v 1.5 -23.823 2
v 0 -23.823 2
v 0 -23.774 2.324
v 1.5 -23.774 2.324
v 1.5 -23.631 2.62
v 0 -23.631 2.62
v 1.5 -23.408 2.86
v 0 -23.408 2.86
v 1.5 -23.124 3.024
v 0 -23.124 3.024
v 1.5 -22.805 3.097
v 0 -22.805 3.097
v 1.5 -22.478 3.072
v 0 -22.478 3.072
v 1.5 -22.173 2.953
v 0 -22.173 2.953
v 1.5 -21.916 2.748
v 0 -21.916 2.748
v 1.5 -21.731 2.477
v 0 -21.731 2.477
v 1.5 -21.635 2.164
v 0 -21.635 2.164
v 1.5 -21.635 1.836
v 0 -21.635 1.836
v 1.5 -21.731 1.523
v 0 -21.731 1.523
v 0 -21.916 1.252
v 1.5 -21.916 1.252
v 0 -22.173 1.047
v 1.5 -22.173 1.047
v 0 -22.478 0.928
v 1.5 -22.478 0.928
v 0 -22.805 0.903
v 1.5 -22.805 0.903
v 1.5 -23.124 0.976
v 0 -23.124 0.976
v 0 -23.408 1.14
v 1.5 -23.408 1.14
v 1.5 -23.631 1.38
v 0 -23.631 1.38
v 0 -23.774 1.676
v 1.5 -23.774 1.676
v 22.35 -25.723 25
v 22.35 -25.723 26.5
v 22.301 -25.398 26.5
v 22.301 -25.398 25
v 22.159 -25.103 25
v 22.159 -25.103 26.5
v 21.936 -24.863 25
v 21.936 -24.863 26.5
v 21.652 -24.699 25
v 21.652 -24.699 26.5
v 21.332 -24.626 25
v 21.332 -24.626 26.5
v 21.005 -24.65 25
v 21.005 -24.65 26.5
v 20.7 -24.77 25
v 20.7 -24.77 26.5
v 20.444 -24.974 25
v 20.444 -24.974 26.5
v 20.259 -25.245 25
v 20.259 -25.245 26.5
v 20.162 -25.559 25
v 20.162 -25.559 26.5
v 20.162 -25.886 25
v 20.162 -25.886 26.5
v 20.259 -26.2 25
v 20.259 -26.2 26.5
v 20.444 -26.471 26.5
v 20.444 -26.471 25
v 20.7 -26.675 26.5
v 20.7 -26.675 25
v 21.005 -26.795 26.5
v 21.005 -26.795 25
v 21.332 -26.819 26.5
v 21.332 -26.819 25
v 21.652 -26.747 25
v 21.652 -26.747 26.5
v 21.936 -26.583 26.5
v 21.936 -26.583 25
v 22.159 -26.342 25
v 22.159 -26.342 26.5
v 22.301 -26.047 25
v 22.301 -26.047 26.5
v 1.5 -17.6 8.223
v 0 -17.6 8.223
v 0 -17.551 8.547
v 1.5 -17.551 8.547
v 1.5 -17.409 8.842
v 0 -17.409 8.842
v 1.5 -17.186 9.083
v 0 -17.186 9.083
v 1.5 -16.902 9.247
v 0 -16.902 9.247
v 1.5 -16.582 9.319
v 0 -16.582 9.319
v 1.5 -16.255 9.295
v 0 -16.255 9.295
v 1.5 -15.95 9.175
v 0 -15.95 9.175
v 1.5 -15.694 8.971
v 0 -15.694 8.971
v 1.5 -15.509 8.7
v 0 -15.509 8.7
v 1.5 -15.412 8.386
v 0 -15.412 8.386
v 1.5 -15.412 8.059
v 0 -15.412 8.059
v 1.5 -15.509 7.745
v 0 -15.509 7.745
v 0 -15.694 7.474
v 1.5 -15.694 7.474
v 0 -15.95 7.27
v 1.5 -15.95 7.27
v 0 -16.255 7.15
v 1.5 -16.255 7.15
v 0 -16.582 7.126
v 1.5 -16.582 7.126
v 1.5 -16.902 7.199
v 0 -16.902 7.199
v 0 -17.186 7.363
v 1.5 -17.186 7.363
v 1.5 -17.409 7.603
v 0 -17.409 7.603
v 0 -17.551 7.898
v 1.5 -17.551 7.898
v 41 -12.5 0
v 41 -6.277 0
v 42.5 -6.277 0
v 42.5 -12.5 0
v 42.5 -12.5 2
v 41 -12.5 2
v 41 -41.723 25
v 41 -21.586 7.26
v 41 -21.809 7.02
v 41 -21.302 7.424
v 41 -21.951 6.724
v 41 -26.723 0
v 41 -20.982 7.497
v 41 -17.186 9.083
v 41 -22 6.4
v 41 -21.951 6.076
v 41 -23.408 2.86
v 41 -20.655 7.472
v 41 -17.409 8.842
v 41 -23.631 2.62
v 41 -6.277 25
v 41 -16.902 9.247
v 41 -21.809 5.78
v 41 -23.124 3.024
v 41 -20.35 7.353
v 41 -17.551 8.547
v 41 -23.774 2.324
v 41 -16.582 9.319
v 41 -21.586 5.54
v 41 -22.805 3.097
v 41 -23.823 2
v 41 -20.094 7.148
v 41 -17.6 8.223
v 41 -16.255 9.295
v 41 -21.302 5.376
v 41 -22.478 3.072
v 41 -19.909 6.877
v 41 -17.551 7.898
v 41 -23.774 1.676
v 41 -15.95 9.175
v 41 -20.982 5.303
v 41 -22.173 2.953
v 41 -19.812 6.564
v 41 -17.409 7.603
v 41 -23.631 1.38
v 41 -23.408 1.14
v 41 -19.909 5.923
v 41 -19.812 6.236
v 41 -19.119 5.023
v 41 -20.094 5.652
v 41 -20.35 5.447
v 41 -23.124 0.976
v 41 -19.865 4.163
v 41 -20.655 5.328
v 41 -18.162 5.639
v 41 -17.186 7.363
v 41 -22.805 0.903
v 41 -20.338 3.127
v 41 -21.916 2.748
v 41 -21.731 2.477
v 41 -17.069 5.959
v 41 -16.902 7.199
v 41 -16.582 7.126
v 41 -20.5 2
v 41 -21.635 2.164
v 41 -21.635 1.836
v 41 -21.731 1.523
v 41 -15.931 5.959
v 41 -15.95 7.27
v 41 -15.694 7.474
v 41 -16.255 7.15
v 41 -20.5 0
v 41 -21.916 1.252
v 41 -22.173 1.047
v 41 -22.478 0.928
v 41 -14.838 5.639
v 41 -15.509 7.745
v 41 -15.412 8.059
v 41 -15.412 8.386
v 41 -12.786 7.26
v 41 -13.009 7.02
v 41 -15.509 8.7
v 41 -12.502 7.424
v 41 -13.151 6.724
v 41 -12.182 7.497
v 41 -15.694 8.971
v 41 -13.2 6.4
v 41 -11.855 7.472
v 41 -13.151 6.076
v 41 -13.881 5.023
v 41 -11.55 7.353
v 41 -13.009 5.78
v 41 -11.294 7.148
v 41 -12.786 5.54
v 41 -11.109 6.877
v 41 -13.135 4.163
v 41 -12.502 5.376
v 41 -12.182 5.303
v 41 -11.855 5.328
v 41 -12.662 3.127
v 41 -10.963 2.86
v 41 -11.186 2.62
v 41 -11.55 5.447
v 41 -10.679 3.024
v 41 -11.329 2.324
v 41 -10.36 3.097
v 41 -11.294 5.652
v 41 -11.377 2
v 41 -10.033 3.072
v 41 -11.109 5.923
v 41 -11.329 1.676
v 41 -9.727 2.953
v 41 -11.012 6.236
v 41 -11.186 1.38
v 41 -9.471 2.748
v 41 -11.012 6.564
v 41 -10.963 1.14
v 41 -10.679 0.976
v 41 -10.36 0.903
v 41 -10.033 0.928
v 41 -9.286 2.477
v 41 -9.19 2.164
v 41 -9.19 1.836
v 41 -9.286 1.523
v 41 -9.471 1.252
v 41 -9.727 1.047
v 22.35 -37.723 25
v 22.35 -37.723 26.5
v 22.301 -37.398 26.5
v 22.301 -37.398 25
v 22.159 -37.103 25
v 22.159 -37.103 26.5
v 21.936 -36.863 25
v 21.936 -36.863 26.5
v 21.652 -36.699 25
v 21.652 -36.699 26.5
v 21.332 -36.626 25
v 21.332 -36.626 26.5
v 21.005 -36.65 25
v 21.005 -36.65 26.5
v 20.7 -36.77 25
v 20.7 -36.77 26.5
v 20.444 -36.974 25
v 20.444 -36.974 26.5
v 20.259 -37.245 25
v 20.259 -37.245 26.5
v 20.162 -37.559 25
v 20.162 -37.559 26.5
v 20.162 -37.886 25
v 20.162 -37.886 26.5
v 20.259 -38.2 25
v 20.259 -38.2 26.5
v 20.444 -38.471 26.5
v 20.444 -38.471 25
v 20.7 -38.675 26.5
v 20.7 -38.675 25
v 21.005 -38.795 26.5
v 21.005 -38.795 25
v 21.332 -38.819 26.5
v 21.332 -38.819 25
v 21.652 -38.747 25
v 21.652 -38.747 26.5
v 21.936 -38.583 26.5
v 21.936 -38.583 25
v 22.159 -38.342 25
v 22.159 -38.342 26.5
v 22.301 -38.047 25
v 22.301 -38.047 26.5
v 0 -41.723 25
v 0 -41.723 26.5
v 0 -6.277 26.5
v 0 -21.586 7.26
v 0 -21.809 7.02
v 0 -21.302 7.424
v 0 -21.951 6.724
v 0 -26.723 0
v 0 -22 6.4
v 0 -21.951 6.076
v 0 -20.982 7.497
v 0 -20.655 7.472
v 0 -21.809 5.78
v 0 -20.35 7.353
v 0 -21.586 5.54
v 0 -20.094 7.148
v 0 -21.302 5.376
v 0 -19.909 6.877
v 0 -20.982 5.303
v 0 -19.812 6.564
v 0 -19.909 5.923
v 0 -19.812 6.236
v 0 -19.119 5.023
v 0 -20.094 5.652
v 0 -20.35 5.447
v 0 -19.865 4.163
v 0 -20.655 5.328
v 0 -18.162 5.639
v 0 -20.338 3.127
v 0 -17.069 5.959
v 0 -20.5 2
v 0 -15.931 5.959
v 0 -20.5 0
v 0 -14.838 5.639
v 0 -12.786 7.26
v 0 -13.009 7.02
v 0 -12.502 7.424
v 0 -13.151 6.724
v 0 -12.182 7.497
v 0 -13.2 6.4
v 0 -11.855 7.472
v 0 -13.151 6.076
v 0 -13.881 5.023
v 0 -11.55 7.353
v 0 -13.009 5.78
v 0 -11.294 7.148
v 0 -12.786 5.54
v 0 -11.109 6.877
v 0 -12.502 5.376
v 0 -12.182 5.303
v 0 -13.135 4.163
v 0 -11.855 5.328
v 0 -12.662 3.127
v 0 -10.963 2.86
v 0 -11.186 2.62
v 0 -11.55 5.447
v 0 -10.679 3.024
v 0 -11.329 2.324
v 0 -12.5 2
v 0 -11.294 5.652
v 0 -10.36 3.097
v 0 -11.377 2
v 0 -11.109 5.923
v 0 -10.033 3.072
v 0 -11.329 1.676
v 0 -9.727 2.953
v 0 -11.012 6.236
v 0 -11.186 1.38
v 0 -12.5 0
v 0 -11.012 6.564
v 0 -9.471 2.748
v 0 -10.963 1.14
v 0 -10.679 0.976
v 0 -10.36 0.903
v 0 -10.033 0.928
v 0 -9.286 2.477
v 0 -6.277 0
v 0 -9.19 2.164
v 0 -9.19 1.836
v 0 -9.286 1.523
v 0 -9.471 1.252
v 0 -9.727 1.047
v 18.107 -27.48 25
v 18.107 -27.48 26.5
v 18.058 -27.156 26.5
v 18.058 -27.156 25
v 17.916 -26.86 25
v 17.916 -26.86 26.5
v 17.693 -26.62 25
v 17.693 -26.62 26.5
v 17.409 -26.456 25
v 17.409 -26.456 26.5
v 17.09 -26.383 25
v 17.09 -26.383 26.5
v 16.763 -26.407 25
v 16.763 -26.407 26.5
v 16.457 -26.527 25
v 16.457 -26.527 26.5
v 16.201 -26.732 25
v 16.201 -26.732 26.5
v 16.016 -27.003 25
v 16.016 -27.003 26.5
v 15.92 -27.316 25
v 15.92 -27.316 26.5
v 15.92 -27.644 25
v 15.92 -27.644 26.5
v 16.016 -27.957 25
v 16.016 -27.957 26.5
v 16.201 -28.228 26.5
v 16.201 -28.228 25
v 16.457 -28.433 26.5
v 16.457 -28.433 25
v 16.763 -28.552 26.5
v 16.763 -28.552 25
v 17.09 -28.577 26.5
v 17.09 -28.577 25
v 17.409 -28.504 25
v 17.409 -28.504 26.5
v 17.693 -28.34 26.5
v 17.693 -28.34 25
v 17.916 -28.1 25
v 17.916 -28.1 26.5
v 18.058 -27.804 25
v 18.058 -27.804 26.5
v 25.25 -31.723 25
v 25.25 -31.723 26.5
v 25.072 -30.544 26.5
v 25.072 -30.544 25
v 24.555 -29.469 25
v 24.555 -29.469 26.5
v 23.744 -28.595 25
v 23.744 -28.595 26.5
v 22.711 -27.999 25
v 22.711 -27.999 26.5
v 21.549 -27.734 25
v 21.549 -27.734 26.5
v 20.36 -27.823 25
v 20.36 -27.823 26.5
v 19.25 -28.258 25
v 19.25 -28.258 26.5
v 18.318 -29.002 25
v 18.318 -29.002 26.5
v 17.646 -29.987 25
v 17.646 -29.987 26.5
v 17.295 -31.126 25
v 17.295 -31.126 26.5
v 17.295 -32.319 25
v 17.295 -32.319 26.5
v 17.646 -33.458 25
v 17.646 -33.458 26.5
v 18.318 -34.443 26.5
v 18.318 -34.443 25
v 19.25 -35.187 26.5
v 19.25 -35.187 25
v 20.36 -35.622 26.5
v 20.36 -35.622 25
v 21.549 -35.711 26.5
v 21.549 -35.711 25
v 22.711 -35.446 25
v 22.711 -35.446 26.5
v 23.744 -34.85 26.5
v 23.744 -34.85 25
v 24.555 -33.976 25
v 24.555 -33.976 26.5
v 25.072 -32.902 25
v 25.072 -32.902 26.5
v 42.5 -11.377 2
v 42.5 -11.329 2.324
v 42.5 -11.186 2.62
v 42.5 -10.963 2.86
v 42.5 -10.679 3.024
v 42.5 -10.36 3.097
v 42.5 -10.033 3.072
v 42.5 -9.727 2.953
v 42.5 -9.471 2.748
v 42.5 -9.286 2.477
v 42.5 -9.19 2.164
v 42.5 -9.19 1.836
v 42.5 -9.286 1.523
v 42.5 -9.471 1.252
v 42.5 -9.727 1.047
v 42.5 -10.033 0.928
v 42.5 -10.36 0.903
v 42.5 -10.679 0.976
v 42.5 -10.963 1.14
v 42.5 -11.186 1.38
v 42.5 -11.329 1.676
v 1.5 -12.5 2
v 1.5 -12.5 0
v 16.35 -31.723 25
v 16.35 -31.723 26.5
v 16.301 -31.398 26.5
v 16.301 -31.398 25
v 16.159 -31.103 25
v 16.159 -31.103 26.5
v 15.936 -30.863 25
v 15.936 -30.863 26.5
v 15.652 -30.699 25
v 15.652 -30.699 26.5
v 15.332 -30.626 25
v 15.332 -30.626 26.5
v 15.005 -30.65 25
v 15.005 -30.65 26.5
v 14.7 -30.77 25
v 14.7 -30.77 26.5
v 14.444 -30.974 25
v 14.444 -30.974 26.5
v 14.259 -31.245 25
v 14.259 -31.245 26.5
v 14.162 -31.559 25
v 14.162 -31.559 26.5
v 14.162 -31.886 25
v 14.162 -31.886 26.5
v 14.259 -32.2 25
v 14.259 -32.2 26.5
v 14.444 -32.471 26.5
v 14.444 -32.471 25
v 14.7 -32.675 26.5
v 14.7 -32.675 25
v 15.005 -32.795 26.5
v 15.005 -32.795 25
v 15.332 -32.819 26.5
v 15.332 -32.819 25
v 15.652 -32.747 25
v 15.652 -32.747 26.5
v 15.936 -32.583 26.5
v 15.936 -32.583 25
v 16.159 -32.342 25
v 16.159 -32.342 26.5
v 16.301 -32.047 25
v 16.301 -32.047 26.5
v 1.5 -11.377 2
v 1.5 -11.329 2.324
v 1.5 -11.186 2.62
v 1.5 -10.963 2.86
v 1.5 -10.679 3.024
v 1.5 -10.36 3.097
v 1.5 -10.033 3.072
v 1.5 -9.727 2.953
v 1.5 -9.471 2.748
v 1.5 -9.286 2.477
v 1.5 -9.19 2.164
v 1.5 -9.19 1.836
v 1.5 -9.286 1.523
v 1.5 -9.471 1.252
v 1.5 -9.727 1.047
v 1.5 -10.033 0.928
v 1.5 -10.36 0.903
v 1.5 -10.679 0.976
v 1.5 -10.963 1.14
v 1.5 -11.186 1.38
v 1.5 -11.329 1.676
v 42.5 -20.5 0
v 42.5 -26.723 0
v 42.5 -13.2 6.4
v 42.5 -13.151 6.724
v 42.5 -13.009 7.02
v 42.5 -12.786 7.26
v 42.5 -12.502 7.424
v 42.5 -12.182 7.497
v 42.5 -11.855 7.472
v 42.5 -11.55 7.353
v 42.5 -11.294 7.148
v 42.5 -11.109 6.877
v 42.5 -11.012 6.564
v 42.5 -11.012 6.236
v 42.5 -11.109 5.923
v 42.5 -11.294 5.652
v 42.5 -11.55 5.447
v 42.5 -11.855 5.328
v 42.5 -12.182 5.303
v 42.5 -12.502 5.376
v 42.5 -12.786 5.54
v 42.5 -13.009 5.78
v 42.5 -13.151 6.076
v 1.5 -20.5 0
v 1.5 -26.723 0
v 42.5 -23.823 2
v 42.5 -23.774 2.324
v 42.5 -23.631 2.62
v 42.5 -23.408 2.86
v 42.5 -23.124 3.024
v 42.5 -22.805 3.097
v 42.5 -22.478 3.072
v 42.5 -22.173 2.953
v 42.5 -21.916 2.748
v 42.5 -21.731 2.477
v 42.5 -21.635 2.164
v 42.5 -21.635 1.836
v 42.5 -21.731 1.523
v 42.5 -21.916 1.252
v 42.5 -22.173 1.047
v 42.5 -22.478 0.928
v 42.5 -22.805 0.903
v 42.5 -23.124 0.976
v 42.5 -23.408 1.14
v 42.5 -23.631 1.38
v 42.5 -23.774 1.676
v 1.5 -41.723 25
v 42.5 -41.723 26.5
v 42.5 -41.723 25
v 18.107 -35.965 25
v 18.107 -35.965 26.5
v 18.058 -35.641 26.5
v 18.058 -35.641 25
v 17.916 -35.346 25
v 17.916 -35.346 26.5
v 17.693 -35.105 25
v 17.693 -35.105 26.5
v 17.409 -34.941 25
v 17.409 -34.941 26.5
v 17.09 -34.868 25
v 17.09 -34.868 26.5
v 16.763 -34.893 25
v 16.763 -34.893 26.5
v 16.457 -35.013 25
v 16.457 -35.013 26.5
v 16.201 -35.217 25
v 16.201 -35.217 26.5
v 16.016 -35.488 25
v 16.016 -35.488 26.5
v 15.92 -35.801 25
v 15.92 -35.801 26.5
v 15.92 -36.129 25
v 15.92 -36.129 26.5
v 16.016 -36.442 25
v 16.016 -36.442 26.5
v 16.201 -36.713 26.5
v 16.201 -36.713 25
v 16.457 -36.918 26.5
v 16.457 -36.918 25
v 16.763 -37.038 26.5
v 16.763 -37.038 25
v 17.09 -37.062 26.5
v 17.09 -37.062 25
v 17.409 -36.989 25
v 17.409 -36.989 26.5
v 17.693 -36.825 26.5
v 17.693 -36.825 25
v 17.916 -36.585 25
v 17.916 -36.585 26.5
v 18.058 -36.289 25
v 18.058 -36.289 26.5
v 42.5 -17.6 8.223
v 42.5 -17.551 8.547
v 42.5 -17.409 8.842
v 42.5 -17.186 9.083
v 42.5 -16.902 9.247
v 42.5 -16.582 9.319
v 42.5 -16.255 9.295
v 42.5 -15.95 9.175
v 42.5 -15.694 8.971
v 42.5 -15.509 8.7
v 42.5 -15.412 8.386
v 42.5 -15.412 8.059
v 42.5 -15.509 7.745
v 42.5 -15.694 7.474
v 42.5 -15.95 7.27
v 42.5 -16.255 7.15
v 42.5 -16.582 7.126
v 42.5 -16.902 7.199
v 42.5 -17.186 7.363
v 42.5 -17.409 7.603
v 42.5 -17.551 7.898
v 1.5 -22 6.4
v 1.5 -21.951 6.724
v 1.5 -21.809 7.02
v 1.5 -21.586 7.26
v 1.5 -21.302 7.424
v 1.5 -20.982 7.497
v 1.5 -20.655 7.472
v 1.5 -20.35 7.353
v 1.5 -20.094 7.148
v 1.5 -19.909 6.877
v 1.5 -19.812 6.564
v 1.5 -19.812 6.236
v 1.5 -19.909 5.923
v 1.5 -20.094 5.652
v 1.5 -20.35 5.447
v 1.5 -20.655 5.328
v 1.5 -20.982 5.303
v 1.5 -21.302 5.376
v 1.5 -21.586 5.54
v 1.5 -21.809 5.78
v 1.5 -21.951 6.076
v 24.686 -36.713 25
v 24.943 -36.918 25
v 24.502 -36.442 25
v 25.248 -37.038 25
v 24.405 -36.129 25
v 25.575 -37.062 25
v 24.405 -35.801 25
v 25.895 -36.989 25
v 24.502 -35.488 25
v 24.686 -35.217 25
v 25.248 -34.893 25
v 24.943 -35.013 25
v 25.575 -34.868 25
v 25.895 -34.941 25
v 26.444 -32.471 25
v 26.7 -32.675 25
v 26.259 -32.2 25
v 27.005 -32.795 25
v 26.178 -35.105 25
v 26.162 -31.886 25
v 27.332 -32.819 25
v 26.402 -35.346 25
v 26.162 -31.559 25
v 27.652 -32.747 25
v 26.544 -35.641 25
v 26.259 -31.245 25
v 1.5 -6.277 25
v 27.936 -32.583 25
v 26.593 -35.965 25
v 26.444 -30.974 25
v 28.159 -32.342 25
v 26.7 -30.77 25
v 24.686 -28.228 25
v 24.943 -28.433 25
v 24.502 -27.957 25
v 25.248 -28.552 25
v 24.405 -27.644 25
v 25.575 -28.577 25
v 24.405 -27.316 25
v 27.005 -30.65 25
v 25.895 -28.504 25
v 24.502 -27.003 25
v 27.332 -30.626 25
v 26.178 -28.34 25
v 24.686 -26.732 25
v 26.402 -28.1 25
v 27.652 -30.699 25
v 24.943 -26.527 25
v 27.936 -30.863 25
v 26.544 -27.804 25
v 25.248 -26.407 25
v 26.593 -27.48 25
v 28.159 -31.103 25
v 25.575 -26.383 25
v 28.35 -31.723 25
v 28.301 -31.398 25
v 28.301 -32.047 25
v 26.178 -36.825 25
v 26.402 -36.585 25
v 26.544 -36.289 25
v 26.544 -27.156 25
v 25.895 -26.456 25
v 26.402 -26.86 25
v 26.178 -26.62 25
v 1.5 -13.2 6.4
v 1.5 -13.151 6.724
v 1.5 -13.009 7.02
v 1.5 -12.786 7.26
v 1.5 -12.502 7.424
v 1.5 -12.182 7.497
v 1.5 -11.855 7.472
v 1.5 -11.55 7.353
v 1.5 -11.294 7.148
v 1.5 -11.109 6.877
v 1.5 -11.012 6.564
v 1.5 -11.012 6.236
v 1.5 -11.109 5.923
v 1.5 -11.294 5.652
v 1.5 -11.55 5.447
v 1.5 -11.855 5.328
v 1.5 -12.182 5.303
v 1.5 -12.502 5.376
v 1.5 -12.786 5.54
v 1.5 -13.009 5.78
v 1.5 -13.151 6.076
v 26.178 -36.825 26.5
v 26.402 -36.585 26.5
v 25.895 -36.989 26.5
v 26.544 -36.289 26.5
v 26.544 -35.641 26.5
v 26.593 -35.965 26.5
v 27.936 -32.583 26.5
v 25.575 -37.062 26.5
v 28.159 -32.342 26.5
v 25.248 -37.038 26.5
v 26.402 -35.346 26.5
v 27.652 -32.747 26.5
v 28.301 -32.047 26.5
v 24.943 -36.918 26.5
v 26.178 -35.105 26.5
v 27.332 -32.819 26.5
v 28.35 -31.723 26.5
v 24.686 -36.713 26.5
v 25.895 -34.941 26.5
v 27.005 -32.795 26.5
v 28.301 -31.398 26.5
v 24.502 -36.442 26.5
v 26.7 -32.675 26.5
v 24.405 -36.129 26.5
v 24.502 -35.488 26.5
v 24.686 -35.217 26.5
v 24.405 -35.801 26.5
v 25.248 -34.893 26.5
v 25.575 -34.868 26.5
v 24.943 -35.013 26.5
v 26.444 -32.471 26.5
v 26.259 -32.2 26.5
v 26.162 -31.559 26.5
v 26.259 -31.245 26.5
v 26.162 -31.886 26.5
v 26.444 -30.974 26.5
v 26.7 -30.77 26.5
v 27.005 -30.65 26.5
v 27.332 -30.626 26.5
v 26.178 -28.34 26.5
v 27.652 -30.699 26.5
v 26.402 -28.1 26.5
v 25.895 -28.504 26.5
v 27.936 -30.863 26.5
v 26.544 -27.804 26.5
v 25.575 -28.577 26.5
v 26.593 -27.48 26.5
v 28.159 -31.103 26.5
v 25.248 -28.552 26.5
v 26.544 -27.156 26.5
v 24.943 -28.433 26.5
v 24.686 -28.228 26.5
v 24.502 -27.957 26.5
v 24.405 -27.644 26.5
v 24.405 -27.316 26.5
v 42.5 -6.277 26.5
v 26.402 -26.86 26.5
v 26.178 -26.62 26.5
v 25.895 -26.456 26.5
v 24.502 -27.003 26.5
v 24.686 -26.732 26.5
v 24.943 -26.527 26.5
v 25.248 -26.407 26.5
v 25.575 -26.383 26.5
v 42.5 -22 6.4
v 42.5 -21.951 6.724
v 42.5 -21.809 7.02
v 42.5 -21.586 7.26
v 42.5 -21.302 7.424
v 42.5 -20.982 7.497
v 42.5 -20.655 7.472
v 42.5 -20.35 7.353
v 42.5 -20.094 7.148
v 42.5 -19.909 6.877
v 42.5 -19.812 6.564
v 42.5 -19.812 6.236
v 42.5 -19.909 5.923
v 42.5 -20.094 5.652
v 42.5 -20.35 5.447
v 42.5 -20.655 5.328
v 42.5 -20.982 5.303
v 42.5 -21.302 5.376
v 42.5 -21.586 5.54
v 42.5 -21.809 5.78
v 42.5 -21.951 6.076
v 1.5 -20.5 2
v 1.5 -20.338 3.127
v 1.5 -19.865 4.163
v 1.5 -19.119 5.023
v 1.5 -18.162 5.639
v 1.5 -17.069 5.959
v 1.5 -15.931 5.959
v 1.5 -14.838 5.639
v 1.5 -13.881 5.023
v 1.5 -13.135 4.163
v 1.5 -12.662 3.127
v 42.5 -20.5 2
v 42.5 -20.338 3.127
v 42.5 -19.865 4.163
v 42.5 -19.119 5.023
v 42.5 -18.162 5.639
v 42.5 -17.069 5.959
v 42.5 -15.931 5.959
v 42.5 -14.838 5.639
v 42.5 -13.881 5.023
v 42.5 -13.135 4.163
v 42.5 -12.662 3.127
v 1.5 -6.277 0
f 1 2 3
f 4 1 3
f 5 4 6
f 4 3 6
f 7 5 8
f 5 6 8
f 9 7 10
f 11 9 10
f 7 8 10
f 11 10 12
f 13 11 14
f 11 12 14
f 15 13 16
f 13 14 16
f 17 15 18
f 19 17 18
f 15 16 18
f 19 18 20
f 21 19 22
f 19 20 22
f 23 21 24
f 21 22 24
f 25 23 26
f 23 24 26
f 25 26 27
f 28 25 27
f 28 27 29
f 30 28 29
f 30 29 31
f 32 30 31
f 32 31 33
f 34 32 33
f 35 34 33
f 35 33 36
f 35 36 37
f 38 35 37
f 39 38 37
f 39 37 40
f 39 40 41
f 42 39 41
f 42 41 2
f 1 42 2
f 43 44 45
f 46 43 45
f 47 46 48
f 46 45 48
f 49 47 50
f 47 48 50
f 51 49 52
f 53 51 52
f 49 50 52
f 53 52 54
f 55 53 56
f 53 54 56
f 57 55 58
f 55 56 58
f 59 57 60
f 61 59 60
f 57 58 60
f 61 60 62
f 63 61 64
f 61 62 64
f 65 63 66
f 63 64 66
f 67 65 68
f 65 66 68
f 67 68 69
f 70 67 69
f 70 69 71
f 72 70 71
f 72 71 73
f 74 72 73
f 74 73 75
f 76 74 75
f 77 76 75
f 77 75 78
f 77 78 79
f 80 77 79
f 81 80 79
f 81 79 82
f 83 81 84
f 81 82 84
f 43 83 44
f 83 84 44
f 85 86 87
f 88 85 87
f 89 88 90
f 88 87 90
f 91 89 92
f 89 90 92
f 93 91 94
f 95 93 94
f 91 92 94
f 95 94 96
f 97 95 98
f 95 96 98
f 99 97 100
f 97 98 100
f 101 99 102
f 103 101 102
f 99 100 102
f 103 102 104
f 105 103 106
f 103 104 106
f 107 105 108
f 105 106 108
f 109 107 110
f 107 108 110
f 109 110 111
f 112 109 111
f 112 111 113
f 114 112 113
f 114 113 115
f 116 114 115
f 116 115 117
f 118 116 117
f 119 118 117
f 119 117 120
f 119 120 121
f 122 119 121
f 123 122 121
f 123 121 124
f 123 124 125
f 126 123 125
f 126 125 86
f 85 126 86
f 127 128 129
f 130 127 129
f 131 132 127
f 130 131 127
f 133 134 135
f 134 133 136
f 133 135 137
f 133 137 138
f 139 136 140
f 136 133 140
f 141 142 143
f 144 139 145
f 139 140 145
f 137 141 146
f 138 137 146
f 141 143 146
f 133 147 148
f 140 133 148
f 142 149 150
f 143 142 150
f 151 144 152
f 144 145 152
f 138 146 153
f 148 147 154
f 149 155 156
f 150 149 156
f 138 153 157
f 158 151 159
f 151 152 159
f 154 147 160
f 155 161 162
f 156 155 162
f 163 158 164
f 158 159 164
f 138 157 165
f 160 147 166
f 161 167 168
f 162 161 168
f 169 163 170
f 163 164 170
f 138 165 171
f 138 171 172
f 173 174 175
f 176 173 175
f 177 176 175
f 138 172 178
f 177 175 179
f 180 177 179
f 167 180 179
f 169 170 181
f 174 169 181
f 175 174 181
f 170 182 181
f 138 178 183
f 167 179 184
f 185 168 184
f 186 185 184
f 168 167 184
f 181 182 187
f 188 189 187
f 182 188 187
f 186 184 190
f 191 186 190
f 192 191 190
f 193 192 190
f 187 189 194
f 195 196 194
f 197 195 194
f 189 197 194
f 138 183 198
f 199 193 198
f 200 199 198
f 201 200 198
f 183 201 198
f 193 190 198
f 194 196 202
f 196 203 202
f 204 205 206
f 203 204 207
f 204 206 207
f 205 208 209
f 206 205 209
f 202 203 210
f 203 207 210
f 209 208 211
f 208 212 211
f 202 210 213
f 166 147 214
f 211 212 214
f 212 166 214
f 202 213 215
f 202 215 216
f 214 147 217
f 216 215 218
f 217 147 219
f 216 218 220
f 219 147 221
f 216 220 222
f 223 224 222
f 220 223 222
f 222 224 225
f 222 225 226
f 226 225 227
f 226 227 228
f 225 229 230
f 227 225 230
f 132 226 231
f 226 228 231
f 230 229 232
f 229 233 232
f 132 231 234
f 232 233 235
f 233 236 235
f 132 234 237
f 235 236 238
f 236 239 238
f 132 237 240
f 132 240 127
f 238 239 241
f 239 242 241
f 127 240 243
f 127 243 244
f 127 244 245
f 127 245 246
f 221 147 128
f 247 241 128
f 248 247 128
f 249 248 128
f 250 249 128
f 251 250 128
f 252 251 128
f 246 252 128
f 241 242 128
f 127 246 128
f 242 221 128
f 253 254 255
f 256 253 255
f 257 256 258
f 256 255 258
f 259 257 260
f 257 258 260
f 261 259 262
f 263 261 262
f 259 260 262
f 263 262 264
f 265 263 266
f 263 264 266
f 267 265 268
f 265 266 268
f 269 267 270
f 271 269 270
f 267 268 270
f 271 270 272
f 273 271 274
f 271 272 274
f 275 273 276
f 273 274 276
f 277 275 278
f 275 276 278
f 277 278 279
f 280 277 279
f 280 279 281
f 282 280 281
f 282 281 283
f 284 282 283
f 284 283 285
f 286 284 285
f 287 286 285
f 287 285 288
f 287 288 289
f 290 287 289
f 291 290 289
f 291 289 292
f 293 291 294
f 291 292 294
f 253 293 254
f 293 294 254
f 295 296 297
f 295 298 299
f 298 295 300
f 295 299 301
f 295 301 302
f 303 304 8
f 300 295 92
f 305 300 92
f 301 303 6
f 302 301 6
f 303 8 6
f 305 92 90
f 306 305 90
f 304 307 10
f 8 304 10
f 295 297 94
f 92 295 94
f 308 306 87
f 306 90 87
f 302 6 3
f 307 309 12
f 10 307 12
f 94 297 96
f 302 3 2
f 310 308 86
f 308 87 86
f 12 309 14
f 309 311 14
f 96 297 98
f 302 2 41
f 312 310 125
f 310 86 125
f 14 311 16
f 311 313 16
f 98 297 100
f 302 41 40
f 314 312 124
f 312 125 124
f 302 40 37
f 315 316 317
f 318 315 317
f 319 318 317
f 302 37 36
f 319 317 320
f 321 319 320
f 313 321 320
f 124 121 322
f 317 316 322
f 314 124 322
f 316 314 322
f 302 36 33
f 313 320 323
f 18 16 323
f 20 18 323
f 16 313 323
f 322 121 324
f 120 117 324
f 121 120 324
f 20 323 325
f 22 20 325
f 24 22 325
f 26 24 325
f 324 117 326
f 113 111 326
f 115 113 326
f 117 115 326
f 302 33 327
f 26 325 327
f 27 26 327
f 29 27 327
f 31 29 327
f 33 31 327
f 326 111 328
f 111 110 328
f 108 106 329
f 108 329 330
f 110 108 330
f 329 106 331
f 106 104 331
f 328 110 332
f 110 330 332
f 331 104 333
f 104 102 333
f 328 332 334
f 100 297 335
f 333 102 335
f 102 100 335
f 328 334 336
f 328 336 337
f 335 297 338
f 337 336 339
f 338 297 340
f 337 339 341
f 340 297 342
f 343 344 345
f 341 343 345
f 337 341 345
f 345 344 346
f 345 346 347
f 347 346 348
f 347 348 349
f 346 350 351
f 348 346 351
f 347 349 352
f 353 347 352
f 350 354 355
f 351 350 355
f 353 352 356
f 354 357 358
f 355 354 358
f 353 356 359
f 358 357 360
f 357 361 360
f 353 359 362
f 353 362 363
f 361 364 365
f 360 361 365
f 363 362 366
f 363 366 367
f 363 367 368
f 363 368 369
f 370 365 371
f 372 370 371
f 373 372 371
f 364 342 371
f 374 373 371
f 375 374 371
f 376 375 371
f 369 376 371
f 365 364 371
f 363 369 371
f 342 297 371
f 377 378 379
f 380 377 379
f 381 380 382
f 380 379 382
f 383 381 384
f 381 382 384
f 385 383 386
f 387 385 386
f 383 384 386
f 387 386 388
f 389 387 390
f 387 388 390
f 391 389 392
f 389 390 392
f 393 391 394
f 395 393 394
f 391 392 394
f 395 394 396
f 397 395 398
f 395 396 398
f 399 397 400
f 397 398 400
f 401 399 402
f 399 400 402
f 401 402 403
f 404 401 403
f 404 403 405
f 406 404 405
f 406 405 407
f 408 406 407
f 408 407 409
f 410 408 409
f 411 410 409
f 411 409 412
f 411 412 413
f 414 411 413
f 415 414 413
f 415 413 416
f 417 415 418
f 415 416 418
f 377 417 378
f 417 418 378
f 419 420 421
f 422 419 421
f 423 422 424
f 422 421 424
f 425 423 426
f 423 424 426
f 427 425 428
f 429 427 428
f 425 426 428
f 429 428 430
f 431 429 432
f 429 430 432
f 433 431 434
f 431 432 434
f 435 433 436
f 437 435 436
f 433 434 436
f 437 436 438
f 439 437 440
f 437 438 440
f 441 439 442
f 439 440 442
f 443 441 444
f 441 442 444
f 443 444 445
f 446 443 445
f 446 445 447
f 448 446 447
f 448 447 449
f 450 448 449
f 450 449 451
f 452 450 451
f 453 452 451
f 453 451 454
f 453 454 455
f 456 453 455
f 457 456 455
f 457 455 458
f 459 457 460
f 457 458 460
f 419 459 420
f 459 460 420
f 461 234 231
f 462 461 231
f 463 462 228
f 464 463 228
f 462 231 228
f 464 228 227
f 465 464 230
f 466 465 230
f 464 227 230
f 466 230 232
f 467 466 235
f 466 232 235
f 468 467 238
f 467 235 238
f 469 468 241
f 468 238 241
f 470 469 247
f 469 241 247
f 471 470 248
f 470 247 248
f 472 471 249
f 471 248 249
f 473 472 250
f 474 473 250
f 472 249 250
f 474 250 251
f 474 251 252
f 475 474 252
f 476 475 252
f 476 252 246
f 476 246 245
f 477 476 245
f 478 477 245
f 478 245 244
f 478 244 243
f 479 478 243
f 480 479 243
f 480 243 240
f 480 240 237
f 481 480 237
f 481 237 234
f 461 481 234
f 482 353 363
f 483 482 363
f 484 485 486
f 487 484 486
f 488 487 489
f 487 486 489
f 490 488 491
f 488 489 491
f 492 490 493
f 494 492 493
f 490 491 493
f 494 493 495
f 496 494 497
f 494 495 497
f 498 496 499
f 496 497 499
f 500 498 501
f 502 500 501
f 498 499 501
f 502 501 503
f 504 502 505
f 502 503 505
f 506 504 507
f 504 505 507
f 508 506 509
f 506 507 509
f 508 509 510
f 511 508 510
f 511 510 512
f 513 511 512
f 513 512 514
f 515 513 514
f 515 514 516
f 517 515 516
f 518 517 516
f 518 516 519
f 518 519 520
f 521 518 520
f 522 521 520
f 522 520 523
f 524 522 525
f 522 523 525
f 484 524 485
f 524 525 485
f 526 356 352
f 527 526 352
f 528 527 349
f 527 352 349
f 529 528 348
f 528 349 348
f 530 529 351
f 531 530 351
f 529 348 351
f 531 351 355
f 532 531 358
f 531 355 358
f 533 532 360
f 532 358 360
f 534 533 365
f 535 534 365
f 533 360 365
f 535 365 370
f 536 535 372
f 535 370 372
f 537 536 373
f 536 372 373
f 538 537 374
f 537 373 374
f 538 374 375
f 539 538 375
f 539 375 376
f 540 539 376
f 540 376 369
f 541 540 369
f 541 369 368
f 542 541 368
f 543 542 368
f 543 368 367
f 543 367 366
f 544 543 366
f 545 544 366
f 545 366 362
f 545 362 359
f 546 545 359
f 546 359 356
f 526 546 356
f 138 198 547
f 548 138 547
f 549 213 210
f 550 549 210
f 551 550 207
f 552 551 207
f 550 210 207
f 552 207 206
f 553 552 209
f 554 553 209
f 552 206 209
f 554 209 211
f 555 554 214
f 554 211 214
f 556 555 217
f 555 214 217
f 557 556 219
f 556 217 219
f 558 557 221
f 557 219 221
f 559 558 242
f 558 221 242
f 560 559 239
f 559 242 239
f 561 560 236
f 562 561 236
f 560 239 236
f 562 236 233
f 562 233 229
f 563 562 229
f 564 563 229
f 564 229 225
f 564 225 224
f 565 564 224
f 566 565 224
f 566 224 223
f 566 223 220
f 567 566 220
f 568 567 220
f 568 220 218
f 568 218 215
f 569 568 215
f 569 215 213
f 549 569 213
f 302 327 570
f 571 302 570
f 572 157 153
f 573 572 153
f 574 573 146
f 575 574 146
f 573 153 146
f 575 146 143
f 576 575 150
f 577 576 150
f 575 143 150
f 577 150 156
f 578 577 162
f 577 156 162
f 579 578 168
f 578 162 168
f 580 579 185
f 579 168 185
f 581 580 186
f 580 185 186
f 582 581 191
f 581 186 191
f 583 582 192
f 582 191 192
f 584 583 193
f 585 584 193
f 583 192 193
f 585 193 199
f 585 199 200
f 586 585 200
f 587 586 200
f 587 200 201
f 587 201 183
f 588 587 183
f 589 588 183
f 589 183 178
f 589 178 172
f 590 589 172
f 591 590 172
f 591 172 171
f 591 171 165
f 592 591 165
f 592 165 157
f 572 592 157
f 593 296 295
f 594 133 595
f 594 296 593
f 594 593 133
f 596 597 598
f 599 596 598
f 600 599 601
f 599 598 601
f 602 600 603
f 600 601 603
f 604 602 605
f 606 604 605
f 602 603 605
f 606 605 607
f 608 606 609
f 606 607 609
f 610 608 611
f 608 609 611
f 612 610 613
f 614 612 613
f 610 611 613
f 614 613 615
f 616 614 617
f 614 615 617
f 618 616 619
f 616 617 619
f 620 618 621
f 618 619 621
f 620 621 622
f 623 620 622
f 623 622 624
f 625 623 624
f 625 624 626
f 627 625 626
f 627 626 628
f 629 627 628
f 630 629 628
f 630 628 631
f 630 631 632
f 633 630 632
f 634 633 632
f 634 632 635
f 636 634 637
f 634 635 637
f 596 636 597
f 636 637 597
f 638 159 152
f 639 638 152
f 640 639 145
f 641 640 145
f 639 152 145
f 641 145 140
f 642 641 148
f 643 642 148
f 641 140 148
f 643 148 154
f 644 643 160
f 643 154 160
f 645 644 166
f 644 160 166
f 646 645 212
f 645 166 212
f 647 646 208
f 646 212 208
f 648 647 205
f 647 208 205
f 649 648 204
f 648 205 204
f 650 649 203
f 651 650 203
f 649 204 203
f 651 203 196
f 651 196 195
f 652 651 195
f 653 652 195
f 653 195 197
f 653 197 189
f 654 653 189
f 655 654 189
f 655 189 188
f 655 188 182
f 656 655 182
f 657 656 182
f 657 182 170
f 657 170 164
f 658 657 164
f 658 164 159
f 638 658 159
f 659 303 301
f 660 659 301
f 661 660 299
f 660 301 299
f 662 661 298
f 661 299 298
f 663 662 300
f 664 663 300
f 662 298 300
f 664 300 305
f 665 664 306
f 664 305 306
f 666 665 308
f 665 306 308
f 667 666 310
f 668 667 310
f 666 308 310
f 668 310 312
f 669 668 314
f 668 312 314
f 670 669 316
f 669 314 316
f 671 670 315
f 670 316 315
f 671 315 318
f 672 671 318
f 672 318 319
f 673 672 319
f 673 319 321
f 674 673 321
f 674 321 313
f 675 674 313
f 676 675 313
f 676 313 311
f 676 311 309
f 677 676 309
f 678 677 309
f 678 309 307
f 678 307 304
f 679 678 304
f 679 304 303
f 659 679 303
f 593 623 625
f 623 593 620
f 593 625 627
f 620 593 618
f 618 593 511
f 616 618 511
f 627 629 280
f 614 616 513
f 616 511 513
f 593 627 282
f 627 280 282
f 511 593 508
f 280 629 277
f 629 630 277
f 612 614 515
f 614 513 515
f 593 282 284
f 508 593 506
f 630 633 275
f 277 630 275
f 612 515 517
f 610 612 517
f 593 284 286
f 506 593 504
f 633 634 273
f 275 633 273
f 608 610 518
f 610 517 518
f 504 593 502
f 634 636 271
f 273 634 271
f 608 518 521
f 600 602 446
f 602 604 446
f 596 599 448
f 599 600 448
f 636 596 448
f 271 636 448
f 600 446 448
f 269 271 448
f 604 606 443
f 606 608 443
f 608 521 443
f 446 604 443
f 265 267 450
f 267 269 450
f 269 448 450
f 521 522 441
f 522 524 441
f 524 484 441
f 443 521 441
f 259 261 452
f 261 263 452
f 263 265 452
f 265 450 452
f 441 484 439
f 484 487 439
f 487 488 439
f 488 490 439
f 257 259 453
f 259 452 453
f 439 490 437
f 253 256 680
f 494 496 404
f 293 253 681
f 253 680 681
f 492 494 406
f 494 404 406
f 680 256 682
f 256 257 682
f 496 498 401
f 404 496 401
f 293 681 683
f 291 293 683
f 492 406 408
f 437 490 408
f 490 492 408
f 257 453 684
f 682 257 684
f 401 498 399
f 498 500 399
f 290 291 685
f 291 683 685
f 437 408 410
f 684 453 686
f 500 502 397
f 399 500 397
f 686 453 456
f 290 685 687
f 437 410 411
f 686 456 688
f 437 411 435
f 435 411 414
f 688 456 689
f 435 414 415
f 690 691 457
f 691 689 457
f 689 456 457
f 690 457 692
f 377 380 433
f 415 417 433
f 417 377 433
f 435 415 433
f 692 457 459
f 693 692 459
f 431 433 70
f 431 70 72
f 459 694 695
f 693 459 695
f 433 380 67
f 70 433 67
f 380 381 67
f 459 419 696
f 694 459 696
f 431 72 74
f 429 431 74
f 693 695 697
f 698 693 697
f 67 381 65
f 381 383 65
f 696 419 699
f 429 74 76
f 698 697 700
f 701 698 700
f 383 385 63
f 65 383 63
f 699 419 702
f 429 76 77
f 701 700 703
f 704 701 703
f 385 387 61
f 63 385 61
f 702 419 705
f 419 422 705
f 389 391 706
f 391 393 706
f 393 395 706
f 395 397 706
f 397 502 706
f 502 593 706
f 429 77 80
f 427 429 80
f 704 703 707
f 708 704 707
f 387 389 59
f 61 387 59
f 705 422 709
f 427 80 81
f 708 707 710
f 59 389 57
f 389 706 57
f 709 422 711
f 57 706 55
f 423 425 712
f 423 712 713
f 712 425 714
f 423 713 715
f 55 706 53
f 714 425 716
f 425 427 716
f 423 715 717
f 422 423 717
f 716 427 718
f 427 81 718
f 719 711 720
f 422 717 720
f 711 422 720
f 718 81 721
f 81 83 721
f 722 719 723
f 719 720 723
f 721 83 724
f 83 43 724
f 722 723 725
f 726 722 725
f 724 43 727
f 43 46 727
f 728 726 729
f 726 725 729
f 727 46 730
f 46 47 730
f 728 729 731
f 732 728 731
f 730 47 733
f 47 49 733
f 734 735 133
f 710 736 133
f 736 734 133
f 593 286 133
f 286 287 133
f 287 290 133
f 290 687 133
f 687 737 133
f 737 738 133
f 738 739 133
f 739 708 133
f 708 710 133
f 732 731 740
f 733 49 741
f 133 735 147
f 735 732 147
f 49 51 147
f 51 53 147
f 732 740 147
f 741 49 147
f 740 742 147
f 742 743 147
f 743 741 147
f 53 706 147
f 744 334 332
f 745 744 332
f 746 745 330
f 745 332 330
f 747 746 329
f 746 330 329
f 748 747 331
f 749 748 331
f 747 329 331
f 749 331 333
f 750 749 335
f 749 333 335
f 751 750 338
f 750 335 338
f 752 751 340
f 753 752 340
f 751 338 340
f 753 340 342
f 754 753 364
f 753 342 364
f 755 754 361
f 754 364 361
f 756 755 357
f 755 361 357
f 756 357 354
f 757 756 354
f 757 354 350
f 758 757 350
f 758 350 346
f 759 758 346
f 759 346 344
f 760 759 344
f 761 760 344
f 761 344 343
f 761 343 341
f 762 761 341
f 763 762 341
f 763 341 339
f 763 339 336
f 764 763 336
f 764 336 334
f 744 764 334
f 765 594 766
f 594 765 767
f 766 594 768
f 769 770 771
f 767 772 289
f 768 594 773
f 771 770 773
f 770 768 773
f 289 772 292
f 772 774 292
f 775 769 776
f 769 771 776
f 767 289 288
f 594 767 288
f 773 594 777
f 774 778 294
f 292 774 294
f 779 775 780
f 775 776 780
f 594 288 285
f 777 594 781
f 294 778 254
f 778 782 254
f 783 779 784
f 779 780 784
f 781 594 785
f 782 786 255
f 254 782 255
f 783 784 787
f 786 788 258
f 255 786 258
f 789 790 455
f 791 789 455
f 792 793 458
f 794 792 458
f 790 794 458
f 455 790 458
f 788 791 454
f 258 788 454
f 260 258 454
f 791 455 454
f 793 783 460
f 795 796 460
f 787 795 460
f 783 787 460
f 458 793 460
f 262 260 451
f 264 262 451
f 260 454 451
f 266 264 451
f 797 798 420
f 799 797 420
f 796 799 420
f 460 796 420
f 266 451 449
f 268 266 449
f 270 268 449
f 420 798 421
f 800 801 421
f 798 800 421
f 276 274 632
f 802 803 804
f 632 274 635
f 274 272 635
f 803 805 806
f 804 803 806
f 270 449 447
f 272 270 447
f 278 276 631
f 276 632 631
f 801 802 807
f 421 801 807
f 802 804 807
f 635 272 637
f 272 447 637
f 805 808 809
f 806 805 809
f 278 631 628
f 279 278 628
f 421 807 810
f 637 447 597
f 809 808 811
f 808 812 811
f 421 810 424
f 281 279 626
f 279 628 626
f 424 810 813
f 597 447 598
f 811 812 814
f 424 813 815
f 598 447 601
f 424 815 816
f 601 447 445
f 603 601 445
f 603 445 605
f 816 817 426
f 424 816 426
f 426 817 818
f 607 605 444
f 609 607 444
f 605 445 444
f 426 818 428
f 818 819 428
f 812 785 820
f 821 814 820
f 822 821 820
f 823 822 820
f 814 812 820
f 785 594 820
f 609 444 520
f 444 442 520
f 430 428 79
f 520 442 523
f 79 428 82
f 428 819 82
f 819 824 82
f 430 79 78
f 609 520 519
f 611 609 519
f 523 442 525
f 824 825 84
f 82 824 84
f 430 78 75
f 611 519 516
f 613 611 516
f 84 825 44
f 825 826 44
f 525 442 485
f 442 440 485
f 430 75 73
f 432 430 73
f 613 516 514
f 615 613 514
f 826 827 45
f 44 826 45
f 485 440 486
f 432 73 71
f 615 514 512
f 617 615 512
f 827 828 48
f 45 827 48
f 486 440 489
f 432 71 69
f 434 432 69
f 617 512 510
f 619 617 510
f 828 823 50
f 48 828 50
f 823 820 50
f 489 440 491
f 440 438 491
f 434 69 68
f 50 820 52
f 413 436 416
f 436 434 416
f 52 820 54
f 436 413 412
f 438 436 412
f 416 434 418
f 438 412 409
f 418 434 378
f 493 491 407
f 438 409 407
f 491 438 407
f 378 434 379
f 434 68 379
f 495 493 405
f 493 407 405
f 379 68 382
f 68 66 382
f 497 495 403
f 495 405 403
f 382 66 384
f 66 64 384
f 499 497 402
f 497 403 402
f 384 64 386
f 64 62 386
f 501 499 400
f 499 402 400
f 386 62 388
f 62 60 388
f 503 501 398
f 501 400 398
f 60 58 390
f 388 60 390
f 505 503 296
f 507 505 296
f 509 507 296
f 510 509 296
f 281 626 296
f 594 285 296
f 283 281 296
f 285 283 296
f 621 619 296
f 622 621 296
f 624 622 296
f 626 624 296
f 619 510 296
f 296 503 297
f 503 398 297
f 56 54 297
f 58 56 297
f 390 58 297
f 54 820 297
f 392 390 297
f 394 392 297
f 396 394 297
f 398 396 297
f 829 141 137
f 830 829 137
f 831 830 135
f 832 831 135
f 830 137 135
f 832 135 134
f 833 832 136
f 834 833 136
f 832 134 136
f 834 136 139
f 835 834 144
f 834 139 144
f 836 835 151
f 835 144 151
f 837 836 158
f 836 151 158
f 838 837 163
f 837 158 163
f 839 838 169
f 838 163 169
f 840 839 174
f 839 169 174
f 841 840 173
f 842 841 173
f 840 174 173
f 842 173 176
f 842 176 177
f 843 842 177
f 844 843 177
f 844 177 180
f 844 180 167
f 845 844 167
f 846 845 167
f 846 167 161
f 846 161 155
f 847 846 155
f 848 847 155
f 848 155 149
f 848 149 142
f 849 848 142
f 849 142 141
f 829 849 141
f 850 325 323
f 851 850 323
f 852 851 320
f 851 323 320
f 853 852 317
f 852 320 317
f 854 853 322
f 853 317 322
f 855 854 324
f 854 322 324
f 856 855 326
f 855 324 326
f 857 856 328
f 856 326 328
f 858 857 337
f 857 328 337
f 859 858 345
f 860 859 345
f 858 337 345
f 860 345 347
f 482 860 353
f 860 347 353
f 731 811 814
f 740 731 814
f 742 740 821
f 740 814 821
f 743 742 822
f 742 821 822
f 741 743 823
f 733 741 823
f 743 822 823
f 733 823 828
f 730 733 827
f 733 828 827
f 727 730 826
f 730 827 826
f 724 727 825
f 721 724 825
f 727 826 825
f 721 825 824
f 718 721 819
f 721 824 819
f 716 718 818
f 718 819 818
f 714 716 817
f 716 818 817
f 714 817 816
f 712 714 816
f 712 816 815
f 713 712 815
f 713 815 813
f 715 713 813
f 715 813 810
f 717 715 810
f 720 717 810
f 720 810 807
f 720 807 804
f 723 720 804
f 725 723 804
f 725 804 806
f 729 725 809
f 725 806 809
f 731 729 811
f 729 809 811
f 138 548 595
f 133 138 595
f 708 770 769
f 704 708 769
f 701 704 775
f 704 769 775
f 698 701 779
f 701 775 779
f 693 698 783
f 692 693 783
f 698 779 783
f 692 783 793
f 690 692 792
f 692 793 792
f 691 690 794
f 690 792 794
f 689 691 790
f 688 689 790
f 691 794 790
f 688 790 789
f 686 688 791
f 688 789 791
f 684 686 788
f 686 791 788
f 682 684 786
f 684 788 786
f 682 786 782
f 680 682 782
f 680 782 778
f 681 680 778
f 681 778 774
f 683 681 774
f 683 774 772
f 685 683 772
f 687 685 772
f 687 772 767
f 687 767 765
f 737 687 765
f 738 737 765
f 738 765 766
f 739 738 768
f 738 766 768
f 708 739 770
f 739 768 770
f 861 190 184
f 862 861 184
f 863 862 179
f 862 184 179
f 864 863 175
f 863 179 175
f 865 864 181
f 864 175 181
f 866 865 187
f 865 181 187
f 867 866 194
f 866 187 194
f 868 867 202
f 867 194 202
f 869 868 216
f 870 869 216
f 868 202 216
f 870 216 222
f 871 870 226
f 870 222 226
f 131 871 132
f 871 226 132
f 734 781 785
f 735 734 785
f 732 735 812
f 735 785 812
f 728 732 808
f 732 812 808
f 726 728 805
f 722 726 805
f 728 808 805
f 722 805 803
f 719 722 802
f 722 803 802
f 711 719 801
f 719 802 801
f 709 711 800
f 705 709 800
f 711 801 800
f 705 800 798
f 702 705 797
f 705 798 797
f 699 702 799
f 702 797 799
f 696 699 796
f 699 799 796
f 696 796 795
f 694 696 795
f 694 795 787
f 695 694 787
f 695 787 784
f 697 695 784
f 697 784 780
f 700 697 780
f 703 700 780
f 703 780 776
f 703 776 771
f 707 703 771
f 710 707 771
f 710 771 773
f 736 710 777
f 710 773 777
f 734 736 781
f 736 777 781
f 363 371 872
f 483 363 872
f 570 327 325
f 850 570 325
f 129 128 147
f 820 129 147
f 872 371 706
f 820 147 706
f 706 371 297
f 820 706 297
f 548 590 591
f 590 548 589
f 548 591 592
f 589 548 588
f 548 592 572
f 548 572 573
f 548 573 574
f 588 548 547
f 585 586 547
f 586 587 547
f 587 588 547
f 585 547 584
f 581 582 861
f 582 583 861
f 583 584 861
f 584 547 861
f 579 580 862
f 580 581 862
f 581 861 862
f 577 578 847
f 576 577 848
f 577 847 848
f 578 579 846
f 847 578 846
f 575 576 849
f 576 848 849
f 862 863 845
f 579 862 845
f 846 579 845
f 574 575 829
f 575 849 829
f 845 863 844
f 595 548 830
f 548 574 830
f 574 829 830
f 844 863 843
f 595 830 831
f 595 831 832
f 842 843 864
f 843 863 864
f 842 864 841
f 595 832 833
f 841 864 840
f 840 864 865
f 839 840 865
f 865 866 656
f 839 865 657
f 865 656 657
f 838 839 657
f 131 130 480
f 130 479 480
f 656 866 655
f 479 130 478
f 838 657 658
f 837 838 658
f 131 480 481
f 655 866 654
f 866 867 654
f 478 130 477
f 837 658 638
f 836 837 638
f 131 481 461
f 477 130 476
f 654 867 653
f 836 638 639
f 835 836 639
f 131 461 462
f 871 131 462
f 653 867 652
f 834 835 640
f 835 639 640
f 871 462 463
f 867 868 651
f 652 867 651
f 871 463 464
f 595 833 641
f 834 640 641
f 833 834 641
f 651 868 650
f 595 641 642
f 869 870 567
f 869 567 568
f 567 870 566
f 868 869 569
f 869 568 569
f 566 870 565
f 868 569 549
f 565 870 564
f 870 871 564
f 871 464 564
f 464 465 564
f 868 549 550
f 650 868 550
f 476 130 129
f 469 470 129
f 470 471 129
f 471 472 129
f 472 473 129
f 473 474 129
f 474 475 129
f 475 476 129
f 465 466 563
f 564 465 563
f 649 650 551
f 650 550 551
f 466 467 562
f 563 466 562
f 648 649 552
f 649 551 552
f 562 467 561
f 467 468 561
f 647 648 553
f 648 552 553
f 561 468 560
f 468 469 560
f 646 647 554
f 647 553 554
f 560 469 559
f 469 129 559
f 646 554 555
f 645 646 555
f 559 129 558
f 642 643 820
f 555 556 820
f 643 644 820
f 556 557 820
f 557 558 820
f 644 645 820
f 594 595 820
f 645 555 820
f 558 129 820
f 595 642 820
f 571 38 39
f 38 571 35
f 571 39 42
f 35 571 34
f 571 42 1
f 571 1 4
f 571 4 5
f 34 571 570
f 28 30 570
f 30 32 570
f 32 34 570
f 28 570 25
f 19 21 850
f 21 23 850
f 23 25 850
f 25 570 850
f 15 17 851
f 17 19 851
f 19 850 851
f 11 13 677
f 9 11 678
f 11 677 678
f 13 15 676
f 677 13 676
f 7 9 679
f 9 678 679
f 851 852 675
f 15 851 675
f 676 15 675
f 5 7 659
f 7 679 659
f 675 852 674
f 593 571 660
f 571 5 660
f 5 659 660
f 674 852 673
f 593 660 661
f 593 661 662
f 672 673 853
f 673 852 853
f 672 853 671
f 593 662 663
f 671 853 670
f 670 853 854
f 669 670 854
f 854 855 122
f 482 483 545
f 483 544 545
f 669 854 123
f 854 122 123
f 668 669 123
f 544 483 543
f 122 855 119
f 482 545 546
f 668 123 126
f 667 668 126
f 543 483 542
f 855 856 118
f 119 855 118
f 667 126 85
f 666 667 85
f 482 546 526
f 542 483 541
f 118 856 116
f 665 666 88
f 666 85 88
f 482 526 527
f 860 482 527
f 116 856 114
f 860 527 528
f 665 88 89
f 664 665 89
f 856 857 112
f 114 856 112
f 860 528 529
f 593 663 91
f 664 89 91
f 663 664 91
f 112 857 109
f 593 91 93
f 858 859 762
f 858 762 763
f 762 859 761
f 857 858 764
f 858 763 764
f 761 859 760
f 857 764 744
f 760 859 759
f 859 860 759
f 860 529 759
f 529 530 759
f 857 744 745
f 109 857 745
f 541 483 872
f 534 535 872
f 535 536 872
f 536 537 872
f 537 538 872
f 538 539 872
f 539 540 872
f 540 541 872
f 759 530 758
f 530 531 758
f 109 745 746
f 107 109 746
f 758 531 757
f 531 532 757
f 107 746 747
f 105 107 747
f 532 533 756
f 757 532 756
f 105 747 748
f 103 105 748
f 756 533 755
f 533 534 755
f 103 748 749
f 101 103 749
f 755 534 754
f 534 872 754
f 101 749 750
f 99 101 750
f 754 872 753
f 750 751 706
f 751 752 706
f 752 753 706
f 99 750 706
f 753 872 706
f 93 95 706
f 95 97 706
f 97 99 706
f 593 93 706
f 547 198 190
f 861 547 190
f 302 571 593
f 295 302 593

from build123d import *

# Parameters (mm, degrees)
F1_DEPTH = 33
F2_R     = 1.1
F2_W     = 6.2774603256
F2_H     = 1.5
F3_DEPTH = 42.501
F5_DEPTH = 15
F7_DEPTH = 42.501
F8_R     = 4
F8_R_2   = 1.1
F9_DEPTH = 1.5


with BuildPart() as f1:
    # F0 (on Front) → F1 (new body)
    with BuildSketch(Plane.XZ):
        Polygon((0, 26.5), (0, 0), (1.5, 0), (1.5, 25), (41, 25), (41, 0), (42.5, 0), (42.5, 26.5), align=None)
    extrude(amount=F1_DEPTH)

    # F2 (on face) → F3 (cut, through all)
    with BuildSketch(Plane(origin=(0, 0, 0), x_dir=(0, -1, 0), z_dir=(-1, 0, 0))):
        with BuildLine():
            Line((20.5, 0), (20.5, 2))
            ThreePointArc((20.5, 2), (16.5, 6), (12.5, 2))
            Line((12.5, 2), (12.5, 0))
            Line((12.5, 0), (20.5, 0))
        make_face()
        with Locations((22.7225396744, 2)):
            Circle(F2_R)
        with Locations((20.9, 6.4)):
            Circle(F2_R)
        with Locations((16.5, 8.2225396744)):
            Circle(F2_R)
        with Locations((12.1, 6.4)):
            Circle(F2_R)
        with Locations((10.2774603256, 2)):
            Circle(F2_R)
        Polygon((0, 0), (6.2774603256, 0), (0, 25), align=None)
        Polygon((0, 25), (6.2774603256, 0), (6.2774603256, 25), align=None)
        with Locations((3.1387301628, 25.75)):
            Rectangle(F2_W, F2_H)
        Polygon((26.7225396744, 0), (33, 0), (33, 25), align=None)
        Polygon((26.7225396744, 0), (33, 25), (26.7225396744, 25), align=None)
        with Locations((29.8612698372, 25.75)):
            Rectangle(F2_W, F2_H)
    extrude(amount=-F3_DEPTH, mode=Mode.SUBTRACT)

    # F4 (on face) → F5 (join)
    with BuildSketch(Plane.XZ.offset(26.7225396744)):
        Polygon((1.5, 0), (1.5, 25), (41, 25), (41, 0), (42.5, 0), (42.5, 26.5), (0, 26.5), (0, 0), align=None)
    extrude(amount=F5_DEPTH)

    # F6 (on face) → F7 (cut, through all)
    with BuildSketch(Plane.YZ.offset(42.5)):
        Polygon((-26.7225396744, 0), (-41.7225396744, 25), (-41.7225396744, 0), align=None)
    extrude(amount=-F7_DEPTH, mode=Mode.SUBTRACT)

    # F8 (on face) → F9 (cut, through all)
    with BuildSketch(Plane.XY.offset(26.5)):
        with Locations((21.25, -31.7225396744)):
            Circle(F8_R)
        with Locations((21.25, -37.7225396744)):
            Circle(F8_R_2)
        with Locations((25.4926406871, -35.9651803616)):
            Circle(F8_R_2)
        with Locations((27.25, -31.7225396744)):
            Circle(F8_R_2)
        with Locations((25.4926406871, -27.4798989873)):
            Circle(F8_R_2)
        with Locations((21.25, -25.7225396744)):
            Circle(F8_R_2)
        with Locations((17.0073593129, -27.4798989873)):
            Circle(F8_R_2)
        with Locations((15.25, -31.7225396744)):
            Circle(F8_R_2)
        with Locations((17.0073593129, -35.9651803616)):
            Circle(F8_R_2)
    extrude(amount=-F9_DEPTH, mode=Mode.SUBTRACT)


solid = f1.part
